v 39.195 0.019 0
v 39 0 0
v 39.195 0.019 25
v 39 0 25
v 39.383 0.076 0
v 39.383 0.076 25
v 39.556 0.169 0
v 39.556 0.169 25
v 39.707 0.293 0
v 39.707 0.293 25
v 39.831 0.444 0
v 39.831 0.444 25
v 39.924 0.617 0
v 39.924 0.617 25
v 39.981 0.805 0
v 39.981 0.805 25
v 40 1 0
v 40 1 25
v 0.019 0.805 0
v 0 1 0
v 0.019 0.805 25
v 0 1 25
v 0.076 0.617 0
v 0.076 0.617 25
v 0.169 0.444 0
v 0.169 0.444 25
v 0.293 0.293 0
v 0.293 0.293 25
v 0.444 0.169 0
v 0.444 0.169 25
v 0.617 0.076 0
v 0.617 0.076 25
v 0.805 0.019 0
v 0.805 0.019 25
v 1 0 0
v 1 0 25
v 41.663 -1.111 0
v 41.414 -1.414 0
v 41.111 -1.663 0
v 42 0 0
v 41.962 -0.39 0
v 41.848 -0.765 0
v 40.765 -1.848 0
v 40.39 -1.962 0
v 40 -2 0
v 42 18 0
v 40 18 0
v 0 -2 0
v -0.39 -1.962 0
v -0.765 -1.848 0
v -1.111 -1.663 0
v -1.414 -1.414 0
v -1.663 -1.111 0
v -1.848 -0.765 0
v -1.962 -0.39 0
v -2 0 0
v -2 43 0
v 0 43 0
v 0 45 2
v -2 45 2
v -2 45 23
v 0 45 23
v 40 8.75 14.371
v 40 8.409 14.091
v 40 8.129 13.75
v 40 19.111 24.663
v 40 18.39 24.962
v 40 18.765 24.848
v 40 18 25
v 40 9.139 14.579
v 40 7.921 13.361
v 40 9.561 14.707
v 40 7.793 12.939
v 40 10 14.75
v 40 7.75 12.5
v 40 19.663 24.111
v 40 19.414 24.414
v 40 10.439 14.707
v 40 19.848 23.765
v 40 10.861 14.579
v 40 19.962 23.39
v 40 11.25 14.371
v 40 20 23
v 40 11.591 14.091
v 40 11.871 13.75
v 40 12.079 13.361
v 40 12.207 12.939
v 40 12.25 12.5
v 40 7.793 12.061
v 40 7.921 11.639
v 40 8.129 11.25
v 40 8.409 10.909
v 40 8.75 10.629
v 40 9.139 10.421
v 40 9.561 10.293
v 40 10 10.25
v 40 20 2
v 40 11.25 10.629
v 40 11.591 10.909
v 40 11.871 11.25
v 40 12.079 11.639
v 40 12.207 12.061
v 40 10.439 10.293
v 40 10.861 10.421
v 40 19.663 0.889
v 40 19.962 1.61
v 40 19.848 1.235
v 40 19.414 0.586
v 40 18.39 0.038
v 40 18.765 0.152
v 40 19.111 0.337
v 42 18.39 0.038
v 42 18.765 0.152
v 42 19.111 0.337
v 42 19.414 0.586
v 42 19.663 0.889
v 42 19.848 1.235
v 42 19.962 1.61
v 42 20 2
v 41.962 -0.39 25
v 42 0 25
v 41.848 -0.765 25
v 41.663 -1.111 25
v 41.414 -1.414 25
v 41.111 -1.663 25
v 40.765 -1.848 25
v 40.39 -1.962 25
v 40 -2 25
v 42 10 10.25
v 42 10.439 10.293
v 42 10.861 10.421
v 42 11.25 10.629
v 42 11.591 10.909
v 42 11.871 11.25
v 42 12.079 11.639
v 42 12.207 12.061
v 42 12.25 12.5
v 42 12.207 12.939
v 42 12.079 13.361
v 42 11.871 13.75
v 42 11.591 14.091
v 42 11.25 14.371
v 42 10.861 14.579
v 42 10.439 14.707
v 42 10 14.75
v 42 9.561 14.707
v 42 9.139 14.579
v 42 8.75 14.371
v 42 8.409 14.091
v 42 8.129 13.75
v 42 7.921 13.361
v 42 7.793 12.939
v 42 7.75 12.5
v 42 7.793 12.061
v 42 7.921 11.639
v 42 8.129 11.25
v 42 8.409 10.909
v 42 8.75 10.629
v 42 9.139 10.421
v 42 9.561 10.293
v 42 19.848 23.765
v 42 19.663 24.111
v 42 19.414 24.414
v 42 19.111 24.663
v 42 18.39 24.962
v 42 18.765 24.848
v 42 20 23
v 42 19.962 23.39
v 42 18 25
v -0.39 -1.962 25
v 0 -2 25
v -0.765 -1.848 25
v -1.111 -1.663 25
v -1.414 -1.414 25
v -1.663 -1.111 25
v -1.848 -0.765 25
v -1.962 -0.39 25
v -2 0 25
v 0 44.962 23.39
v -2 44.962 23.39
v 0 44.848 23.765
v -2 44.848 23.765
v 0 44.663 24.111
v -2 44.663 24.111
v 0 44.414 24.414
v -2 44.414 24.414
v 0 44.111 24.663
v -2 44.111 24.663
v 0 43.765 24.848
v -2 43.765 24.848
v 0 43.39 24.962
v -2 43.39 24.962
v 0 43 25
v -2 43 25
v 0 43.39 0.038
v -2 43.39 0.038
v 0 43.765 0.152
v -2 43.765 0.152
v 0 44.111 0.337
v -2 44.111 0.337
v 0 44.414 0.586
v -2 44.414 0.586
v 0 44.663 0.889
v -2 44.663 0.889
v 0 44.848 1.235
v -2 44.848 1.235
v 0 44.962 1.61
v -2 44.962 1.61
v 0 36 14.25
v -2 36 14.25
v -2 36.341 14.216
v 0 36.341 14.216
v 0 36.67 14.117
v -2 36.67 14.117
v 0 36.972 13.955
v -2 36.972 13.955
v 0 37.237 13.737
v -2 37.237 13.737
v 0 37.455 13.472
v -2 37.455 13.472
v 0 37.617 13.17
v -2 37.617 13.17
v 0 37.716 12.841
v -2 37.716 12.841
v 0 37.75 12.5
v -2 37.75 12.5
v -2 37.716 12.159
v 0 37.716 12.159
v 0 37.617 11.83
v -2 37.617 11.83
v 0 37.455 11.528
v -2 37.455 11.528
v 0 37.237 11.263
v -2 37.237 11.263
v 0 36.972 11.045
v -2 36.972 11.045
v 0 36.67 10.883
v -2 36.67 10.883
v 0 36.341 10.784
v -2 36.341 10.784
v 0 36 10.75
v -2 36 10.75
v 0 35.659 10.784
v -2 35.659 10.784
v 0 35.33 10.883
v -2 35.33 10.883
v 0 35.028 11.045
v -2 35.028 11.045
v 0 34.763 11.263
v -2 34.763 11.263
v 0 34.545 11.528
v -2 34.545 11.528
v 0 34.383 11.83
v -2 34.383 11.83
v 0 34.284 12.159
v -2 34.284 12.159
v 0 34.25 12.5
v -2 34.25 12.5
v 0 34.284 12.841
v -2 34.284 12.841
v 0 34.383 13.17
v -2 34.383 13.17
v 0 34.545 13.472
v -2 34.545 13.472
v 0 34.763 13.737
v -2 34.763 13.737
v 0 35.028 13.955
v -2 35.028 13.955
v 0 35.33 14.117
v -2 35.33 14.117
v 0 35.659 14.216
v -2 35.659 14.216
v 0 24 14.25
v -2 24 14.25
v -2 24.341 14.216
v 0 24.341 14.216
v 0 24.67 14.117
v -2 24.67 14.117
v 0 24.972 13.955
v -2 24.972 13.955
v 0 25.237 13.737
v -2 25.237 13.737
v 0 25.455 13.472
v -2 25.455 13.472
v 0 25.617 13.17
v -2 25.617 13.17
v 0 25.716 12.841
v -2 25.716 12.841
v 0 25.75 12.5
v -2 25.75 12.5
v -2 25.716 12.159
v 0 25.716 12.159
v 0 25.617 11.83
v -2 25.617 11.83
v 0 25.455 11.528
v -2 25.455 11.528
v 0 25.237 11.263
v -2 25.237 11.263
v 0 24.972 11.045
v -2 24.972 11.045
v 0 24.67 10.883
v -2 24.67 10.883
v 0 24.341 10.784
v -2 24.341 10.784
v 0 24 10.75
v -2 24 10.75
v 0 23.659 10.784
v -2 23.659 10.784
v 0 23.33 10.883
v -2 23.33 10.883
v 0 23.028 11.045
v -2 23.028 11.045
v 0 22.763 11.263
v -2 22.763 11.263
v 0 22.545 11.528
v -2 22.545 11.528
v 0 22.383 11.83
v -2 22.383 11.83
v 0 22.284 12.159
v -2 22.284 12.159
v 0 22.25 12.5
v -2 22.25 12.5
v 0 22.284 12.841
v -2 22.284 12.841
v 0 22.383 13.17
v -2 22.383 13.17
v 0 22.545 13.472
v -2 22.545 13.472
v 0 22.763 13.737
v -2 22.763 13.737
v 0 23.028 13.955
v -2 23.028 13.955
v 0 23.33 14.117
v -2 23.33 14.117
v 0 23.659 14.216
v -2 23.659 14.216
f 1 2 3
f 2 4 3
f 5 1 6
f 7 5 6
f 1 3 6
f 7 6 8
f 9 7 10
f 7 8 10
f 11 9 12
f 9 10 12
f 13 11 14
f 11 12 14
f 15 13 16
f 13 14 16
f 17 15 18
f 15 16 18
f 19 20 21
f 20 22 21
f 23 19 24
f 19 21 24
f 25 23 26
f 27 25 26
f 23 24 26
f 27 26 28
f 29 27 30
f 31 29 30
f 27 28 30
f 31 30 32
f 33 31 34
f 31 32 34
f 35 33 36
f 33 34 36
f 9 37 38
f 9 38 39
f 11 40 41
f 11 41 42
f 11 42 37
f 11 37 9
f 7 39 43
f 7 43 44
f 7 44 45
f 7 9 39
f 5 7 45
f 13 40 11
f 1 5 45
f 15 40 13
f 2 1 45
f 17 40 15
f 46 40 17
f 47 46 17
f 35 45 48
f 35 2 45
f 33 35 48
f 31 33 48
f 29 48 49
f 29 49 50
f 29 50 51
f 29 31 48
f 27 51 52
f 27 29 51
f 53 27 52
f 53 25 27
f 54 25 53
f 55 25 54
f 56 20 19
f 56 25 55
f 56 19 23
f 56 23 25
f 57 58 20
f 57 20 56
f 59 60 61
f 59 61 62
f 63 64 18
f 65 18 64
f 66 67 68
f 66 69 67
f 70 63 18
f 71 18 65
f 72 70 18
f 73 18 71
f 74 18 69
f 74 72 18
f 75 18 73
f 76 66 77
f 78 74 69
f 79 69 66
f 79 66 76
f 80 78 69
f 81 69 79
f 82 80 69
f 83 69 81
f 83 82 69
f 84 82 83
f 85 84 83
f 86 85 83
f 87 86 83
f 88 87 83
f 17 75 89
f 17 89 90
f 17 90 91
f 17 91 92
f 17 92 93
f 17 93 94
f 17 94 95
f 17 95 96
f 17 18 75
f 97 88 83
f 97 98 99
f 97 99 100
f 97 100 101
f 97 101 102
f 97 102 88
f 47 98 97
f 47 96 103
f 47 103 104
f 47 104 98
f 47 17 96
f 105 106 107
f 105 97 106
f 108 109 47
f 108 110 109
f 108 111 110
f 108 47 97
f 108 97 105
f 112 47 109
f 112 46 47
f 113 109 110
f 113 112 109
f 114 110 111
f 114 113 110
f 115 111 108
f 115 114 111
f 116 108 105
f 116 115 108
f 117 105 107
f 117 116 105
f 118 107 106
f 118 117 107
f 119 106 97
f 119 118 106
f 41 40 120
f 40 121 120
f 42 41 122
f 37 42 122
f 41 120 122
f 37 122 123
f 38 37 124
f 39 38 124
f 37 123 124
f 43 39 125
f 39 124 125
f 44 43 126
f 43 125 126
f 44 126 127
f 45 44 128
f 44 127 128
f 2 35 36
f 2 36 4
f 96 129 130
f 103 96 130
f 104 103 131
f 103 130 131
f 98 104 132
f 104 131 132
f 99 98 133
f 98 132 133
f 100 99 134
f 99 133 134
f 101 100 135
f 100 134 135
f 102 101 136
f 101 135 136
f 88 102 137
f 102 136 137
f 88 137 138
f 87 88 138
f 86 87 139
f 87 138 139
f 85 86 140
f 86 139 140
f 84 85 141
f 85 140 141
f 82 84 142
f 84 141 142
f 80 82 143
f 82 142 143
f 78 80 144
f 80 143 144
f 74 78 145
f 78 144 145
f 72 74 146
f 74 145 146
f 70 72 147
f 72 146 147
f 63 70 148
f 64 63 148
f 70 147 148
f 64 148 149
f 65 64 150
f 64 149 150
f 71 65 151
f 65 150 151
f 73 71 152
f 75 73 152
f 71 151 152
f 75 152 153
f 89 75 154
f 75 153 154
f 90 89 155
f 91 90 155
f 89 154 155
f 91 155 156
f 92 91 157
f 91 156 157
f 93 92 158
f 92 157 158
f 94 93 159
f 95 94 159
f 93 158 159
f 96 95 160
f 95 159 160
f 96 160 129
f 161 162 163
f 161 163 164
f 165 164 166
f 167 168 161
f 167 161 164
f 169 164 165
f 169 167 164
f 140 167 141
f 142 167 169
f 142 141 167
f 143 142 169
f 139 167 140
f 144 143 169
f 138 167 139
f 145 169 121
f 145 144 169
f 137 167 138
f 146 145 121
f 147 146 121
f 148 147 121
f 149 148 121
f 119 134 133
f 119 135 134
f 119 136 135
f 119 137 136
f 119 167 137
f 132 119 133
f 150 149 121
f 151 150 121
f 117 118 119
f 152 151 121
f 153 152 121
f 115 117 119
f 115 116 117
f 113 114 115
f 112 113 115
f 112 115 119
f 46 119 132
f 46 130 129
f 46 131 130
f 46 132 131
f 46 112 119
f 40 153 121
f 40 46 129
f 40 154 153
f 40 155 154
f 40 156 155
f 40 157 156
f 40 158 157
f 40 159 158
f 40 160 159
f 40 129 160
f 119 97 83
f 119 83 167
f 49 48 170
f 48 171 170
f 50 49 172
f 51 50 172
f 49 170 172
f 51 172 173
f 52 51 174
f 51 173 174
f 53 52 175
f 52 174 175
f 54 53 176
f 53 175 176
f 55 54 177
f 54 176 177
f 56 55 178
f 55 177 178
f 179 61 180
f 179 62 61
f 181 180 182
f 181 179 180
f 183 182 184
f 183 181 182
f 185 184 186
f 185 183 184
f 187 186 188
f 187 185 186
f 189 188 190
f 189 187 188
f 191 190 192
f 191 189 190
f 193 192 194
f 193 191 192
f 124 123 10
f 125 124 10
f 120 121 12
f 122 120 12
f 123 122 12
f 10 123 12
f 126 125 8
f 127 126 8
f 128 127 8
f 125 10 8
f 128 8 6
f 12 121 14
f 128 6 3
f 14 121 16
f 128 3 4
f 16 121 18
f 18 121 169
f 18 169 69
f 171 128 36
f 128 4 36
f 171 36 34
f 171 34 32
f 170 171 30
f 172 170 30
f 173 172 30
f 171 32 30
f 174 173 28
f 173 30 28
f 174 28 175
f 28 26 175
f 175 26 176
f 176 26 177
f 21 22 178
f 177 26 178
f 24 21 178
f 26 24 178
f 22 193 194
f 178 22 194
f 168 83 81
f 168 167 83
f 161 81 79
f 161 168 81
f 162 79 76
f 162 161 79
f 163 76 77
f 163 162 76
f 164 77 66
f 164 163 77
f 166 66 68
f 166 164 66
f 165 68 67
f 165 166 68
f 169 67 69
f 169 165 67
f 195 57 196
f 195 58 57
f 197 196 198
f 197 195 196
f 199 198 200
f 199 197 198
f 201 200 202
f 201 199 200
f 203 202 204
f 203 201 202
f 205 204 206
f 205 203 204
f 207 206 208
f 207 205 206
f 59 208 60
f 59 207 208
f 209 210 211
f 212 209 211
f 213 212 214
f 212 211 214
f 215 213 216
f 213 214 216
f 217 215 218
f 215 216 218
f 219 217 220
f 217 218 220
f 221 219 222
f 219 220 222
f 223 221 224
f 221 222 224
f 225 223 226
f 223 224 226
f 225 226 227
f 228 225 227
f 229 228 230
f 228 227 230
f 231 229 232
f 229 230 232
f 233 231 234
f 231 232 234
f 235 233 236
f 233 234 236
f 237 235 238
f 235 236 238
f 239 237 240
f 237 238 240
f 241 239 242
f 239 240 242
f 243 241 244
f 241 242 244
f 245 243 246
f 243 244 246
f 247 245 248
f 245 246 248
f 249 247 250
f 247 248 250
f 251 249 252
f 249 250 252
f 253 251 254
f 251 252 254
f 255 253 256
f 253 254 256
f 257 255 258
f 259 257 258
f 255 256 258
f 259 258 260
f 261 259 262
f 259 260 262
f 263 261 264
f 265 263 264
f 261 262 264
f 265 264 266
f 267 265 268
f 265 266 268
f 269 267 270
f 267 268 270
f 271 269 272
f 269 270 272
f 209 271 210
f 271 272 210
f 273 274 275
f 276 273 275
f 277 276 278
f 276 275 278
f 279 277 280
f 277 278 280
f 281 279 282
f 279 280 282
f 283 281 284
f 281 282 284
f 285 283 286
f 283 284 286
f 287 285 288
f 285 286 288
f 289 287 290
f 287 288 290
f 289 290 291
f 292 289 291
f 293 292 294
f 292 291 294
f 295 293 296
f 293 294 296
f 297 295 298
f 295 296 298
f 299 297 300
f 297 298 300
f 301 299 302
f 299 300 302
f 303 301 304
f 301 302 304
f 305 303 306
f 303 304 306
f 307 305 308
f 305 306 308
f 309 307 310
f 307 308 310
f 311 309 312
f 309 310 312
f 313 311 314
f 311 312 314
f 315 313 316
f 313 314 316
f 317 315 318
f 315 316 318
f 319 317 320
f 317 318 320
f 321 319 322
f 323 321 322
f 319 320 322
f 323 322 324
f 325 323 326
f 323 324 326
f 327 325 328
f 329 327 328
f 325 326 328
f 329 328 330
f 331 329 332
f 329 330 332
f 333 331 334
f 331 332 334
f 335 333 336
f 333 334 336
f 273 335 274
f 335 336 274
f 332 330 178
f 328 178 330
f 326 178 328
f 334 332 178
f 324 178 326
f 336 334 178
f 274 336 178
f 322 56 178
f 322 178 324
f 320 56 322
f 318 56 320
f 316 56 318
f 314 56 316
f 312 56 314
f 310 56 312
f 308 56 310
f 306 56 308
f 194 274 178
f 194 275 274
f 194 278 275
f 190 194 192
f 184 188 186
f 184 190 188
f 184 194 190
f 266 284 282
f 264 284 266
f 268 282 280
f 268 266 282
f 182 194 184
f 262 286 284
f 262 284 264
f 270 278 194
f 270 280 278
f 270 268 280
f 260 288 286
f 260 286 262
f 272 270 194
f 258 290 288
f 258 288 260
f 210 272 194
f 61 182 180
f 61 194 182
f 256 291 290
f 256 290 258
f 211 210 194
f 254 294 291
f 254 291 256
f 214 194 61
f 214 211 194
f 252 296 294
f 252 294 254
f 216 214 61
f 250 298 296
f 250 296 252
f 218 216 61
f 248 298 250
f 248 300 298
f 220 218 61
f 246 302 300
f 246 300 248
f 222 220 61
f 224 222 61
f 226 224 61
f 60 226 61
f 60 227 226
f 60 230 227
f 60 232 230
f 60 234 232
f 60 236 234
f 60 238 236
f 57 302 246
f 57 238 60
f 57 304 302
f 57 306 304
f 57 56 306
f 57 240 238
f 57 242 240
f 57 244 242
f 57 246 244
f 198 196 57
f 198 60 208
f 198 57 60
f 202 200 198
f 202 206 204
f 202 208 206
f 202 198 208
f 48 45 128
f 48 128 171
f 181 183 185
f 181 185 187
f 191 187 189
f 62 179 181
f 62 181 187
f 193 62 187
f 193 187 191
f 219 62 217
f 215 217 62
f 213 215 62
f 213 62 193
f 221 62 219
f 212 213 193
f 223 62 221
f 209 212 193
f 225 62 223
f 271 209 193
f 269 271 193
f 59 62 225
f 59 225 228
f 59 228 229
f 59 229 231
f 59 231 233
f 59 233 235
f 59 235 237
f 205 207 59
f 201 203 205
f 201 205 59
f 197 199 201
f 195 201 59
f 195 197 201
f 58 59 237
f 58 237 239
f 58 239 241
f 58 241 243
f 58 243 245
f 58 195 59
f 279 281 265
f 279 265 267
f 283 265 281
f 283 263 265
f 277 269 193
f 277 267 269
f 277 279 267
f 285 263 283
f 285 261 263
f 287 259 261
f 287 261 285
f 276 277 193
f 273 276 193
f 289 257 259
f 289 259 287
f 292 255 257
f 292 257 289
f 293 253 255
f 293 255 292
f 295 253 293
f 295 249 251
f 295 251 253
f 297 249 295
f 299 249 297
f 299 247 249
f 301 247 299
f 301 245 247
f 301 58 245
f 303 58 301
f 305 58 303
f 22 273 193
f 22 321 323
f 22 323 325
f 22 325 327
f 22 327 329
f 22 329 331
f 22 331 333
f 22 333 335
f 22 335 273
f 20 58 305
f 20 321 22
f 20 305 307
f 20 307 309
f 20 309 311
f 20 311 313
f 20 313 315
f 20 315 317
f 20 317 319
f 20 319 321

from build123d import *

# Parameters (mm, degrees)
EXTRU_MINCE1_DEPTH      = 25
CONG_1_R                = 1
CONG_2_R                = 1
CONG_3_R                = 2
CONG_4_R                = 2
ESQUISSE2_R             = 1.75
ENL_V_MAT_EXTRU_1_DEPTH = 2
ESQUISSE3_R             = 2.25
ENL_V_MAT_EXTRU_2_DEPTH = 2
CONG_12_R               = 2
CONG_13_R               = 2
CONG_15_R               = 2
CONG_16_R               = 2


with BuildPart() as part:
    # Esquisse1 → Extru.-Mince1 (new body)
    with BuildSketch(Plane.XY):
        Polygon((0, 45), (0, 0), (40, 0), (40, 20), (42, 20), (42, -2), (-2, -2), (-2, 45), align=None)
    extrude(amount=EXTRU_MINCE1_DEPTH)

    # Congé1
    cong_1_edges = [part.edges().sort_by_distance(p)[0] for p in [
        (0, 0, 12.5),
    ]]
    fillet(cong_1_edges, radius=CONG_1_R)

    # Congé2
    cong_2_edges = [part.edges().sort_by_distance(p)[0] for p in [
        (40, 0, 12.5),
    ]]
    fillet(cong_2_edges, radius=CONG_2_R)

    # Congé3
    cong_3_edges = [part.edges().sort_by_distance(p)[0] for p in [
        (42, -2, 12.5),
    ]]
    fillet(cong_3_edges, radius=CONG_3_R)

    # Congé4
    cong_4_edges = [part.edges().sort_by_distance(p)[0] for p in [
        (-2, -2, 12.5),
    ]]
    fillet(cong_4_edges, radius=CONG_4_R)

    # Esquisse2 → Enlèv. mat.-Extru.1 (cut)
    with BuildSketch(Plane.ZY.offset(2)):
        with Locations((12.5, 36)):
            Circle(ESQUISSE2_R)
        with Locations((12.5, 24)):
            Circle(ESQUISSE2_R)
    extrude(amount=-ENL_V_MAT_EXTRU_1_DEPTH, mode=Mode.SUBTRACT)

    # Esquisse3 → Enlèv. mat.-Extru.2 (cut)
    with BuildSketch(Plane(origin=(42, 0, 0), x_dir=(0, 0, -1), z_dir=(1, 0, 0))):
        with Locations((-12.5, 10)):
            Circle(ESQUISSE3_R)
    extrude(amount=-ENL_V_MAT_EXTRU_2_DEPTH, mode=Mode.SUBTRACT)

    # Congé12
    cong_12_edges = [part.edges().sort_by_distance(p)[0] for p in [
        (41, 20, 0),
    ]]
    fillet(cong_12_edges, radius=CONG_12_R)

    # Congé13
    cong_13_edges = [part.edges().sort_by_distance(p)[0] for p in [
        (41, 20, 25),
    ]]
    fillet(cong_13_edges, radius=CONG_13_R)

    # Congé15
    cong_15_edges = [part.edges().sort_by_distance(p)[0] for p in [
        (-1, 45, 0),
    ]]
    fillet(cong_15_edges, radius=CONG_15_R)

    # Congé16
    cong_16_edges = [part.edges().sort_by_distance(p)[0] for p in [
        (-1, 45, 25),
    ]]
    fillet(cong_16_edges, radius=CONG_16_R)


solid = part.part
